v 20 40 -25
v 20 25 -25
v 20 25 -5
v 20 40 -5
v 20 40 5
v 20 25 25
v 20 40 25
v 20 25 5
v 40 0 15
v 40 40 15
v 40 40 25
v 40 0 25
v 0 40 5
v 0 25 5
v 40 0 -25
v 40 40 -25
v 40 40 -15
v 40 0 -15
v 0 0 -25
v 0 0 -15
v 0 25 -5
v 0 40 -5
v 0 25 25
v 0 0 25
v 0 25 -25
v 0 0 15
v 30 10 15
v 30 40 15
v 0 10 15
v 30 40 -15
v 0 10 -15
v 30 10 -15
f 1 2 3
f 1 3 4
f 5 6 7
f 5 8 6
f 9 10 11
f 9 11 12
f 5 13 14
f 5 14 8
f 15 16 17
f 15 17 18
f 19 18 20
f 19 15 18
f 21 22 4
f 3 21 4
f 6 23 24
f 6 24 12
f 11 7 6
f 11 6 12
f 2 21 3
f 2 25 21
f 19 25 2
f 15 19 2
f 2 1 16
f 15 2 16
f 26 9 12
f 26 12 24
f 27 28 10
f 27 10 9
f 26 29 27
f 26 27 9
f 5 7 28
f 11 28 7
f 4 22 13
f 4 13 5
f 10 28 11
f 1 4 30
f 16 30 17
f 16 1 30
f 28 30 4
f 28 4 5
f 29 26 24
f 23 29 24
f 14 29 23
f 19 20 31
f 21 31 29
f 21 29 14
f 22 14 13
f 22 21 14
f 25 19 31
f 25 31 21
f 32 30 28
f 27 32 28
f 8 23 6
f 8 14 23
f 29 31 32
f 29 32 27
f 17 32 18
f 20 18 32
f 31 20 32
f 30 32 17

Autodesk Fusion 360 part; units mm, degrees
sketch "Sketch1" plane through (0, 0, 0) normal (0, 0, 1) x (1, 0, 0)
  line L0 (0, 0) -> (0, 25)
  line L1 (0, 25) -> (20, 25)
  line L2 (20, 25) -> (20, 40)
  line L3 (20, 40) -> (40, 40)
  line L4 (40, 40) -> (40, 0)
  line L5 (40, 0) -> (0, 0)
  dimension "d1" = 40
  dimension "d2" = 25
  dimension "d3" = 20
  dimension "d4" = 15
extrude "Extrude1" add sketch "Sketch1" along normal mid plane 50
sketch "Sketch2" plane through (0, 0, 0) normal (0, 0, 1) x (1, 0, 0)
  line L0 (0, 40) -> (20, 40)
  line L1 (20, 40) -> (20, 25)
  line L2 (20, 25) -> (0, 25)
  line L3 (0, 25) -> (0, 40)
  point P0 (20, 25)
  point P1 (0, 25)
  dimension "d7" = 20
  dimension "d8" = 15
extrude "Extrude2" add sketch "Sketch2" along normal mid plane 10
sketch "Sketch3" plane through (0, 40, 0) normal (0, 1, 0) x (-1, 0, 0)
  line L0 (-20, -25) -> (-20, -5)
  line L1 (-20, -5) -> (0, -5)
  line L2 (0, -5) -> (0, 5)
  line L3 (0, 5) -> (-20, 5)
  line L4 (-20, 5) -> (-20, 25)
  line L5 (-20, 25) -> (-40, 25)
  line L6 (-40, 25) -> (-40, -25)
  line L7 (-40, -25) -> (-20, -25)
  line L8 (-40, -15) -> (-30, -15)
  line L9 (-30, -15) -> (-30, 15)
  line L10 (-30, 15) -> (-40, 15)
  line L11 (-40, 15) -> (-40, -15)
  dimension "d11" = 10
  dimension "d12" = 10
  dimension "d13" = 30
  dimension "d14" = 10
extrude "Extrude3" cut sketch "Sketch3" against normal blind 85 contours L6 L8 L9 L10 L11
sketch "Sketch4" plane through (0, 0, 0) normal (1, 0, 0) x (0, 0, -1)
  line L0 (15, 0) -> (15, 10)
  line L1 (15, 10) -> (-15, 10)
  line L2 (-15, 10) -> (-15, 0)
  line L3 (25, 0) -> (-25, 0)
  dimension "d17" = 10
  dimension "d18" = 10
  dimension "d19" = 10
  dimension "d20" = 30
extrude "Extrude4" cut sketch "Sketch4" along normal blind 88
